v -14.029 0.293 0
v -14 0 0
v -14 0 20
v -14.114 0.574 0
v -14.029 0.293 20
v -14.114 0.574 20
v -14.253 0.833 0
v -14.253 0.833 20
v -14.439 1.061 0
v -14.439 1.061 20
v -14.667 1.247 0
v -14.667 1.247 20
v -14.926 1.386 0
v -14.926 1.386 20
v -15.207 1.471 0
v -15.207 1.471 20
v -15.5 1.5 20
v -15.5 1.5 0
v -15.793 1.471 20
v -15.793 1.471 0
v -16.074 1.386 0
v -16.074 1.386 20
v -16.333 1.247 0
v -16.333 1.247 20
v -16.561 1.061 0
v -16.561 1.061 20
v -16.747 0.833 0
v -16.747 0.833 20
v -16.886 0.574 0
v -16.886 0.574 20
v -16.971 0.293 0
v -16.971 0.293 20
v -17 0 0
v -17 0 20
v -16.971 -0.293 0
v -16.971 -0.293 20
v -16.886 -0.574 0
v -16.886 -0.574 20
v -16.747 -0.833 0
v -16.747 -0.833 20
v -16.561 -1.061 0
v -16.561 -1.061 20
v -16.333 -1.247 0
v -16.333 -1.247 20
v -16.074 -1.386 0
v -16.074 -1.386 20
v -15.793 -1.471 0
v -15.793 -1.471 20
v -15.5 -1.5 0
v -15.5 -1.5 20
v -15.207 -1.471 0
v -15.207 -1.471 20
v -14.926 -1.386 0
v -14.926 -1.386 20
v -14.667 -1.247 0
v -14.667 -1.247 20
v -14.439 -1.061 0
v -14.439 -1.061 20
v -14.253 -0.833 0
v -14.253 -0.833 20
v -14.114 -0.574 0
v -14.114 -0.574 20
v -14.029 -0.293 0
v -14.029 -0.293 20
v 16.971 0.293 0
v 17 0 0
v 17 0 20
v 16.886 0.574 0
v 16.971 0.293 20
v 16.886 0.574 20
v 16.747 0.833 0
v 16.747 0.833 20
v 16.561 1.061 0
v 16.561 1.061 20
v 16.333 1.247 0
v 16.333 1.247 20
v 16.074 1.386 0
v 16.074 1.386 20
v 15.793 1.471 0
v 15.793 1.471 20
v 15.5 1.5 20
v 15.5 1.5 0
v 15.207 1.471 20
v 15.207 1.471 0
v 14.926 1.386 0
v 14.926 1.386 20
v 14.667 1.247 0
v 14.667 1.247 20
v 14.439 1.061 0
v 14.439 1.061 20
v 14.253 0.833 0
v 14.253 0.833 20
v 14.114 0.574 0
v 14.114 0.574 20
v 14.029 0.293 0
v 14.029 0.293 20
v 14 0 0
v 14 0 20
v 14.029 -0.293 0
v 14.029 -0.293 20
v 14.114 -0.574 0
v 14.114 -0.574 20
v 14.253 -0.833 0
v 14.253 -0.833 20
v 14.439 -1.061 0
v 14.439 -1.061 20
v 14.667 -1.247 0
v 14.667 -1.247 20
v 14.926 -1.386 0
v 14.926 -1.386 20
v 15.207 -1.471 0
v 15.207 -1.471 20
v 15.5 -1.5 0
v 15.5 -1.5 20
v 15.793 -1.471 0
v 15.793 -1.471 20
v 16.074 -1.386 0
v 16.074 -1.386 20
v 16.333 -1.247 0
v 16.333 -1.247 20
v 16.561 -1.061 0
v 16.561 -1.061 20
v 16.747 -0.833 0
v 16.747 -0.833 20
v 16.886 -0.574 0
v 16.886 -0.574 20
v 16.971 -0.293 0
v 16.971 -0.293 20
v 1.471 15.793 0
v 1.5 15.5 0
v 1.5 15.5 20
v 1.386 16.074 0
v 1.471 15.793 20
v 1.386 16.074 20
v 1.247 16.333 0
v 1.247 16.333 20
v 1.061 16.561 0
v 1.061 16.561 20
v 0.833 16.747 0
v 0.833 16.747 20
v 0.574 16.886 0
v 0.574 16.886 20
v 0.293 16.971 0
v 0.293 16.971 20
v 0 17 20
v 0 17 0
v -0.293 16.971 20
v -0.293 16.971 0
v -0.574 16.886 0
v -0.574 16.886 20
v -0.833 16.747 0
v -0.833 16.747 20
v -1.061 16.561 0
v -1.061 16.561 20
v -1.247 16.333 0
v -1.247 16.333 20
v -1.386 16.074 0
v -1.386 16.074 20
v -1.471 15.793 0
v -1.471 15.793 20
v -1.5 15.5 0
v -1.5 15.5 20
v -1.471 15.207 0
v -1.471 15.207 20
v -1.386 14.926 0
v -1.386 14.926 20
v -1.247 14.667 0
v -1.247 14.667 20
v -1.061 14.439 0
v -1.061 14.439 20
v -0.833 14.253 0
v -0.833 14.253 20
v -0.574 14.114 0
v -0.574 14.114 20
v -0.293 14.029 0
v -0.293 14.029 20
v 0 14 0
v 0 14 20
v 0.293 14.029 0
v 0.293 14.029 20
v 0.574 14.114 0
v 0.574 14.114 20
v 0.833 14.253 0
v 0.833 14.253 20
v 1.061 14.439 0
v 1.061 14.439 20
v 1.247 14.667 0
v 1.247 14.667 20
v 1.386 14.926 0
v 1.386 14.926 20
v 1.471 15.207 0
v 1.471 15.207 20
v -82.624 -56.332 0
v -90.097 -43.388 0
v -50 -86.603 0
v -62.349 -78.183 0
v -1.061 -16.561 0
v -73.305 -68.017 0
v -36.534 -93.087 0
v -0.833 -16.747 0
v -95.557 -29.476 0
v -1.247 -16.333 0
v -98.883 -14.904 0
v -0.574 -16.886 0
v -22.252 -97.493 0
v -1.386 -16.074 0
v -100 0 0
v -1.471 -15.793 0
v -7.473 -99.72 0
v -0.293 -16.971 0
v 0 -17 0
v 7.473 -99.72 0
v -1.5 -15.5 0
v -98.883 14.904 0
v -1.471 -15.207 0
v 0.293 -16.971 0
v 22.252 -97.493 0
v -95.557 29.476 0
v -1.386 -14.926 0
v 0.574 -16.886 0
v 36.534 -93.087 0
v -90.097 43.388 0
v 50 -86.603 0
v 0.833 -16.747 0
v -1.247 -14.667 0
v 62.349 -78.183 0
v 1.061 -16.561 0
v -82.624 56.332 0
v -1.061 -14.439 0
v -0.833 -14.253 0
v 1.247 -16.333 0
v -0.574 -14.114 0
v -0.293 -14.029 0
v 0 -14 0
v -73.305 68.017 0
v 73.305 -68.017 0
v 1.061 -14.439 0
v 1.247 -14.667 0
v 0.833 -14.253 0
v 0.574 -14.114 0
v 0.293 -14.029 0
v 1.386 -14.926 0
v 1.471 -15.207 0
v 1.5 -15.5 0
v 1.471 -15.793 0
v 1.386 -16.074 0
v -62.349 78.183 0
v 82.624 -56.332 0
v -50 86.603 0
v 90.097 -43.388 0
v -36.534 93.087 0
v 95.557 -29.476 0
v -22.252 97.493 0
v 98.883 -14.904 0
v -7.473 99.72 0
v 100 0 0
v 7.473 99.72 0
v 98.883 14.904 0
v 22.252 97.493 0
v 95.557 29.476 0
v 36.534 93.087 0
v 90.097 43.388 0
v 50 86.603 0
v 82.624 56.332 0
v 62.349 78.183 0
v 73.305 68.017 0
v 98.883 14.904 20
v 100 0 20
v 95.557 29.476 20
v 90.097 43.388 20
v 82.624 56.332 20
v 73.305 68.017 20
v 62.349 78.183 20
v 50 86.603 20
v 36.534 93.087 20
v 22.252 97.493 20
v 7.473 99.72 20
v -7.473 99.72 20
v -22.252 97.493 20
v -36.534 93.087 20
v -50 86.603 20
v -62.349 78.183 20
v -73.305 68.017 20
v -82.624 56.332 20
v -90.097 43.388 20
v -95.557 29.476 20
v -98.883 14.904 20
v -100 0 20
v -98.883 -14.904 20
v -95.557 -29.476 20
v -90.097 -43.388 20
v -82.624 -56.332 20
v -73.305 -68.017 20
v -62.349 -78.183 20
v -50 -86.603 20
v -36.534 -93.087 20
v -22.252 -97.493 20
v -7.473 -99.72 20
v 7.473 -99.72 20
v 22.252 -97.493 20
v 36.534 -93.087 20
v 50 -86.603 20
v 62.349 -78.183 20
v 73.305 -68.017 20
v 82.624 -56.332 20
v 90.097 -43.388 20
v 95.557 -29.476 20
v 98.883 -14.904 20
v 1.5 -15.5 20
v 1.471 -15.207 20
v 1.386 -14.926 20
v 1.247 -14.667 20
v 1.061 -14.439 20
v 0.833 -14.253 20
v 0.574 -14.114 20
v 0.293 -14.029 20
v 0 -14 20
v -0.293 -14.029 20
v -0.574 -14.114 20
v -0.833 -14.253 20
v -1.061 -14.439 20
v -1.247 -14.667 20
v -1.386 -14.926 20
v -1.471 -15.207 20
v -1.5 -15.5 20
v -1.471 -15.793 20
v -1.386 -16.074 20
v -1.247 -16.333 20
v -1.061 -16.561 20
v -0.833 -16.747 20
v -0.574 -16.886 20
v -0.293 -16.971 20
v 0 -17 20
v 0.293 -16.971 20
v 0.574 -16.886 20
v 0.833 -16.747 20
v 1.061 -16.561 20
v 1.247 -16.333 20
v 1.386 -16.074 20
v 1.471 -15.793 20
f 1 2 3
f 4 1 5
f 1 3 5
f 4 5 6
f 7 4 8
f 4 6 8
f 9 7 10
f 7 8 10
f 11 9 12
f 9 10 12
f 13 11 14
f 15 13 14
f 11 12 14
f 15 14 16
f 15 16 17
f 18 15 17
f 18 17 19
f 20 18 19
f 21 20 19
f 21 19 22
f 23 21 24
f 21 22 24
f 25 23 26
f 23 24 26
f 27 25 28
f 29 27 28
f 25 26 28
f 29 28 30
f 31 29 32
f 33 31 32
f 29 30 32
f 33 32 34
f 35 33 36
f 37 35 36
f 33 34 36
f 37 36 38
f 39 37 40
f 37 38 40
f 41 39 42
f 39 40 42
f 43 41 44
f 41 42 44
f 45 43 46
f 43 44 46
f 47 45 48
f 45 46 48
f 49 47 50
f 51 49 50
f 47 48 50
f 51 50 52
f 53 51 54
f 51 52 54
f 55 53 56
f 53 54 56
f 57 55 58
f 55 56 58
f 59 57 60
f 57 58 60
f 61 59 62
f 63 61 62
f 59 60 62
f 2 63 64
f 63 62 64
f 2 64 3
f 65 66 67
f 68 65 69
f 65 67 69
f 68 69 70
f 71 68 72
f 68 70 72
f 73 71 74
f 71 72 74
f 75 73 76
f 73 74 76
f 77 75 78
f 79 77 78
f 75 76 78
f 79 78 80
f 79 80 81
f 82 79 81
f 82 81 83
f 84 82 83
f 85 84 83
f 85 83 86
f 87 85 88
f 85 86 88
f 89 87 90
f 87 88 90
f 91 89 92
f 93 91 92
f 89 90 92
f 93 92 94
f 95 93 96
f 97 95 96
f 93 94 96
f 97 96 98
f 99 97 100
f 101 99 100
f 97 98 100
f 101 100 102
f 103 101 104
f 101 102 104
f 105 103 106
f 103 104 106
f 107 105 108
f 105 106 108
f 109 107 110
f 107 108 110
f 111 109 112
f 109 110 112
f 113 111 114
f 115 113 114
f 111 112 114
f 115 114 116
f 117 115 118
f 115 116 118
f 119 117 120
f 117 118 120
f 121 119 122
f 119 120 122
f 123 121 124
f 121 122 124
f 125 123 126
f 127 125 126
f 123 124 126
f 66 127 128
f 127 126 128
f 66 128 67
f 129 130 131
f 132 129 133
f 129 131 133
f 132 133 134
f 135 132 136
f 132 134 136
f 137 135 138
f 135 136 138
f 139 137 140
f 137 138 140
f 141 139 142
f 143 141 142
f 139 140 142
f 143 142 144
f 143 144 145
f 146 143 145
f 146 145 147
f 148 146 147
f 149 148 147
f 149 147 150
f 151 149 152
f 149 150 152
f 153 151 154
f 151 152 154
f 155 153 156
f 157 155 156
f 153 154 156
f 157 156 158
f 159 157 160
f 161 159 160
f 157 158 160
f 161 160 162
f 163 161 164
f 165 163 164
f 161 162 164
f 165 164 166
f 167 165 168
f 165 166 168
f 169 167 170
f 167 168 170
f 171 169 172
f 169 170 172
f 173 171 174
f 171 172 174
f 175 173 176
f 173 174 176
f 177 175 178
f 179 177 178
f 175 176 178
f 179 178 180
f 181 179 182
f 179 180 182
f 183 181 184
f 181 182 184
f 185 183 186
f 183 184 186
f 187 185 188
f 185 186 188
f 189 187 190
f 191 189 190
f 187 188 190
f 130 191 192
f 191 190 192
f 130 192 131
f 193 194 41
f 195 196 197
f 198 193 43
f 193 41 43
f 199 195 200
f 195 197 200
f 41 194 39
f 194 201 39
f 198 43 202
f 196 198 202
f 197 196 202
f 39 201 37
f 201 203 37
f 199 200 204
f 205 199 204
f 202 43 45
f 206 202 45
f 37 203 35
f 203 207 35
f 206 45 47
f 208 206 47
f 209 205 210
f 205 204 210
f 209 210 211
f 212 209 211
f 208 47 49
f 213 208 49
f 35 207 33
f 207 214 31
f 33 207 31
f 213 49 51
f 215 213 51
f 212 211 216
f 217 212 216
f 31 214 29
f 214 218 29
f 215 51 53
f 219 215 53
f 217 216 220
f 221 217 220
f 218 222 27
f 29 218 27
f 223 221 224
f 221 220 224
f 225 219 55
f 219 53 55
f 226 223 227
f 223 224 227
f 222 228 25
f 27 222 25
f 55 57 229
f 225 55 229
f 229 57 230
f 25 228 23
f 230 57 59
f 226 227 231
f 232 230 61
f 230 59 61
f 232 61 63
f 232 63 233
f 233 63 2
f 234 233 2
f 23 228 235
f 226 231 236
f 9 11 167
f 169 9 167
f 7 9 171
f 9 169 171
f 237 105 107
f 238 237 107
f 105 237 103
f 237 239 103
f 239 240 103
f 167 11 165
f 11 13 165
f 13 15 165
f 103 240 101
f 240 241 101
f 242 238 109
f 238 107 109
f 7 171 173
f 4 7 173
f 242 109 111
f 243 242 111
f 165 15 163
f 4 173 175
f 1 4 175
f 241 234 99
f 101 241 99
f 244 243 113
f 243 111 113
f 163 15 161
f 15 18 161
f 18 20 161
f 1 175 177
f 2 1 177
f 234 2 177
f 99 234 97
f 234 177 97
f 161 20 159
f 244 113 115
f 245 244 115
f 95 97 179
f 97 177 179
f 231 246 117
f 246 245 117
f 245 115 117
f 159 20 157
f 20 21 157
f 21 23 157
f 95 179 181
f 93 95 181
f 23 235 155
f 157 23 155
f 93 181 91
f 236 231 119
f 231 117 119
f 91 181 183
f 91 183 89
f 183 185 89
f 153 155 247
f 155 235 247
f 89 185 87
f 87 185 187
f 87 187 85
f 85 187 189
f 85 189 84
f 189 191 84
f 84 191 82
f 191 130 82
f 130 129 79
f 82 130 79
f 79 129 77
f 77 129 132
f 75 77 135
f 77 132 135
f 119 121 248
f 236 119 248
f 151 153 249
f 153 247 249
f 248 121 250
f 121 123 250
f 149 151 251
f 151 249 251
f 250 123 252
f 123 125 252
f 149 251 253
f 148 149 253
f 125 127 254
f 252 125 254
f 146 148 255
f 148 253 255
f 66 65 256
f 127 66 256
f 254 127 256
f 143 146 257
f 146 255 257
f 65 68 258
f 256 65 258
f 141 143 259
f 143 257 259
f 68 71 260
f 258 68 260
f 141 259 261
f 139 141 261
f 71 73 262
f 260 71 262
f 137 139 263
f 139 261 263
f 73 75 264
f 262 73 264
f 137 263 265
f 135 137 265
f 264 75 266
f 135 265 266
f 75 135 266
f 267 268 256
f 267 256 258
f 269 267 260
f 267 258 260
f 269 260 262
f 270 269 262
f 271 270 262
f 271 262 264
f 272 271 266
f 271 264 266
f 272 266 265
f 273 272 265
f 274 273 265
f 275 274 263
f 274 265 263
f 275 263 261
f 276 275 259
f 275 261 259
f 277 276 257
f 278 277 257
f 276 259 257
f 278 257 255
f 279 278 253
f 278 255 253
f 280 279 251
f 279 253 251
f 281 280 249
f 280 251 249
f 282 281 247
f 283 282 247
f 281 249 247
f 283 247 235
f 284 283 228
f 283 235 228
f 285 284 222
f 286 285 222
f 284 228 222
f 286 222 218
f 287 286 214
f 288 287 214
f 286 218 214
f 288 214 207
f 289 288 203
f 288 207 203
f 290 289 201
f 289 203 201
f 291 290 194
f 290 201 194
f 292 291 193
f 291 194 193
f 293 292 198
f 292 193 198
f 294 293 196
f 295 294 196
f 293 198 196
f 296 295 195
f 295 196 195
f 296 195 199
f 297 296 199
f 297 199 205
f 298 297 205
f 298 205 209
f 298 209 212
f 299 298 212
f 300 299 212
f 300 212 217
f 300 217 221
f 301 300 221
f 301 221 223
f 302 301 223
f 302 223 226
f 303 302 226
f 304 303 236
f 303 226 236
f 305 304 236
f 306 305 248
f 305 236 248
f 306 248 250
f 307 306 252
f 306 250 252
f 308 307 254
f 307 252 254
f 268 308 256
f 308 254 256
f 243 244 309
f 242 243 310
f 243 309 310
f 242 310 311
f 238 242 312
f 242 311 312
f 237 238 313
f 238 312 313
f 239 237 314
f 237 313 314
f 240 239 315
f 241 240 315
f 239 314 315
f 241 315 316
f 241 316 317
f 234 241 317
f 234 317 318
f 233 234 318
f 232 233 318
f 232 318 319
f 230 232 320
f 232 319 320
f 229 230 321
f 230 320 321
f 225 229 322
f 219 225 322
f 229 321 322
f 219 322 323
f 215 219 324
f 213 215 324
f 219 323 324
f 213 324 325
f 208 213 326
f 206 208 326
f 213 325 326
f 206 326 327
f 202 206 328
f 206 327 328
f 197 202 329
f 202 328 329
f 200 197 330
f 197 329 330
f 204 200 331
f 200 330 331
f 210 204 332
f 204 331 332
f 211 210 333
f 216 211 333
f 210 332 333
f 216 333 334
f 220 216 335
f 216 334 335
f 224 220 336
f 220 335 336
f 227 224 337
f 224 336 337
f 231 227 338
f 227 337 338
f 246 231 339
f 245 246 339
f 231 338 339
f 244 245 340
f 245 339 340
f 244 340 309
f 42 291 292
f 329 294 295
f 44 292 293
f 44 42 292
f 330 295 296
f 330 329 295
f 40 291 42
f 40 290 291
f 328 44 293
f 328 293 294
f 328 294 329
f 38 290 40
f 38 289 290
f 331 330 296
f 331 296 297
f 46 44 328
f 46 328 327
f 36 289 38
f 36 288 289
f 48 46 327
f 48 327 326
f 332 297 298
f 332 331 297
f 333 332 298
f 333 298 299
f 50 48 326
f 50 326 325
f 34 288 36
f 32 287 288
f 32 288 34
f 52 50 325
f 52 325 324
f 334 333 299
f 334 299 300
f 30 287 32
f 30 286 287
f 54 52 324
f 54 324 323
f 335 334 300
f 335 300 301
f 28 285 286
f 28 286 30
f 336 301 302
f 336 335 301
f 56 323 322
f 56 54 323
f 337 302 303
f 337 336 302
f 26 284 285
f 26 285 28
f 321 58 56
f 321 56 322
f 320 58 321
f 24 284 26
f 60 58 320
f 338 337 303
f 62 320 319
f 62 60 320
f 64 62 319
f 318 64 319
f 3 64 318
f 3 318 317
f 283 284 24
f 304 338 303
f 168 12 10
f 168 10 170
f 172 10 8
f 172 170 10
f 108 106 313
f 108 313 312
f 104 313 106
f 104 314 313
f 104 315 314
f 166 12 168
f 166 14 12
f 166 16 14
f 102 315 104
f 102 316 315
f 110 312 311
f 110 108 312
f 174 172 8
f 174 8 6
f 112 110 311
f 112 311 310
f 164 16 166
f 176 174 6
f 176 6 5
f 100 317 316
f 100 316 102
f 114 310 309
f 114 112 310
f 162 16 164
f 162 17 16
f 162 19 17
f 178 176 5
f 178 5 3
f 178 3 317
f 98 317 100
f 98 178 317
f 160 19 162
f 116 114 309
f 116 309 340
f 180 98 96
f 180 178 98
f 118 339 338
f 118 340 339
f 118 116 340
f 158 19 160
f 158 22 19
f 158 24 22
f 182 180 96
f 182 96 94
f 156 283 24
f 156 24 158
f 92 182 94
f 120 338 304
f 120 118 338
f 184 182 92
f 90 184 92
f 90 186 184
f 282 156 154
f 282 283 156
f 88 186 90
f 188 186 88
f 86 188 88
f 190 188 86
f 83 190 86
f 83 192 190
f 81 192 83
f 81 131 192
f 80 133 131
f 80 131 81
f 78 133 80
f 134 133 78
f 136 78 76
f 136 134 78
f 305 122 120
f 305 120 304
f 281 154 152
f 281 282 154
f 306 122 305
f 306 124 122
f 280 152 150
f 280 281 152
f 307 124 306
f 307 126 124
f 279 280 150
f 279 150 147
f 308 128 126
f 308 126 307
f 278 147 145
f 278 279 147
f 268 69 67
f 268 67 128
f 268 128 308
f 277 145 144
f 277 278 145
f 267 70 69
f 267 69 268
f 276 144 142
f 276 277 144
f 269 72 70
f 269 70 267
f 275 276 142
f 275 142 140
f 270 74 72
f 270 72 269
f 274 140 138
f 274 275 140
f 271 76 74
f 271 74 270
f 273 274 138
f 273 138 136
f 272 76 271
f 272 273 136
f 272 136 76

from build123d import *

# Parameters (mm, degrees)
SKETCH_1_R          = 100
EXTRUDE_1_DEPTH     = 20
SKETCH_2_R          = 1.5
CUT_EXTRUDE_1_DEPTH = 20


with BuildPart() as part:
    # 草图1 → 凸台-拉伸1 (new body)
    with BuildSketch(Plane.XY):
        Circle(SKETCH_1_R)
    extrude(amount=EXTRUDE_1_DEPTH)

    # 草图2 → 切除-拉伸1 (cut)
    with BuildSketch(Plane.XY.offset(20)):
        with Locations((0, 15.5)):
            Circle(SKETCH_2_R)
        with Locations((-15.5, 0)):
            Circle(SKETCH_2_R)
        with Locations((15.5, 0)):
            Circle(SKETCH_2_R)
        with Locations((0, -15.5)):
            Circle(SKETCH_2_R)
    extrude(amount=-CUT_EXTRUDE_1_DEPTH, mode=Mode.SUBTRACT)


solid = part.part
